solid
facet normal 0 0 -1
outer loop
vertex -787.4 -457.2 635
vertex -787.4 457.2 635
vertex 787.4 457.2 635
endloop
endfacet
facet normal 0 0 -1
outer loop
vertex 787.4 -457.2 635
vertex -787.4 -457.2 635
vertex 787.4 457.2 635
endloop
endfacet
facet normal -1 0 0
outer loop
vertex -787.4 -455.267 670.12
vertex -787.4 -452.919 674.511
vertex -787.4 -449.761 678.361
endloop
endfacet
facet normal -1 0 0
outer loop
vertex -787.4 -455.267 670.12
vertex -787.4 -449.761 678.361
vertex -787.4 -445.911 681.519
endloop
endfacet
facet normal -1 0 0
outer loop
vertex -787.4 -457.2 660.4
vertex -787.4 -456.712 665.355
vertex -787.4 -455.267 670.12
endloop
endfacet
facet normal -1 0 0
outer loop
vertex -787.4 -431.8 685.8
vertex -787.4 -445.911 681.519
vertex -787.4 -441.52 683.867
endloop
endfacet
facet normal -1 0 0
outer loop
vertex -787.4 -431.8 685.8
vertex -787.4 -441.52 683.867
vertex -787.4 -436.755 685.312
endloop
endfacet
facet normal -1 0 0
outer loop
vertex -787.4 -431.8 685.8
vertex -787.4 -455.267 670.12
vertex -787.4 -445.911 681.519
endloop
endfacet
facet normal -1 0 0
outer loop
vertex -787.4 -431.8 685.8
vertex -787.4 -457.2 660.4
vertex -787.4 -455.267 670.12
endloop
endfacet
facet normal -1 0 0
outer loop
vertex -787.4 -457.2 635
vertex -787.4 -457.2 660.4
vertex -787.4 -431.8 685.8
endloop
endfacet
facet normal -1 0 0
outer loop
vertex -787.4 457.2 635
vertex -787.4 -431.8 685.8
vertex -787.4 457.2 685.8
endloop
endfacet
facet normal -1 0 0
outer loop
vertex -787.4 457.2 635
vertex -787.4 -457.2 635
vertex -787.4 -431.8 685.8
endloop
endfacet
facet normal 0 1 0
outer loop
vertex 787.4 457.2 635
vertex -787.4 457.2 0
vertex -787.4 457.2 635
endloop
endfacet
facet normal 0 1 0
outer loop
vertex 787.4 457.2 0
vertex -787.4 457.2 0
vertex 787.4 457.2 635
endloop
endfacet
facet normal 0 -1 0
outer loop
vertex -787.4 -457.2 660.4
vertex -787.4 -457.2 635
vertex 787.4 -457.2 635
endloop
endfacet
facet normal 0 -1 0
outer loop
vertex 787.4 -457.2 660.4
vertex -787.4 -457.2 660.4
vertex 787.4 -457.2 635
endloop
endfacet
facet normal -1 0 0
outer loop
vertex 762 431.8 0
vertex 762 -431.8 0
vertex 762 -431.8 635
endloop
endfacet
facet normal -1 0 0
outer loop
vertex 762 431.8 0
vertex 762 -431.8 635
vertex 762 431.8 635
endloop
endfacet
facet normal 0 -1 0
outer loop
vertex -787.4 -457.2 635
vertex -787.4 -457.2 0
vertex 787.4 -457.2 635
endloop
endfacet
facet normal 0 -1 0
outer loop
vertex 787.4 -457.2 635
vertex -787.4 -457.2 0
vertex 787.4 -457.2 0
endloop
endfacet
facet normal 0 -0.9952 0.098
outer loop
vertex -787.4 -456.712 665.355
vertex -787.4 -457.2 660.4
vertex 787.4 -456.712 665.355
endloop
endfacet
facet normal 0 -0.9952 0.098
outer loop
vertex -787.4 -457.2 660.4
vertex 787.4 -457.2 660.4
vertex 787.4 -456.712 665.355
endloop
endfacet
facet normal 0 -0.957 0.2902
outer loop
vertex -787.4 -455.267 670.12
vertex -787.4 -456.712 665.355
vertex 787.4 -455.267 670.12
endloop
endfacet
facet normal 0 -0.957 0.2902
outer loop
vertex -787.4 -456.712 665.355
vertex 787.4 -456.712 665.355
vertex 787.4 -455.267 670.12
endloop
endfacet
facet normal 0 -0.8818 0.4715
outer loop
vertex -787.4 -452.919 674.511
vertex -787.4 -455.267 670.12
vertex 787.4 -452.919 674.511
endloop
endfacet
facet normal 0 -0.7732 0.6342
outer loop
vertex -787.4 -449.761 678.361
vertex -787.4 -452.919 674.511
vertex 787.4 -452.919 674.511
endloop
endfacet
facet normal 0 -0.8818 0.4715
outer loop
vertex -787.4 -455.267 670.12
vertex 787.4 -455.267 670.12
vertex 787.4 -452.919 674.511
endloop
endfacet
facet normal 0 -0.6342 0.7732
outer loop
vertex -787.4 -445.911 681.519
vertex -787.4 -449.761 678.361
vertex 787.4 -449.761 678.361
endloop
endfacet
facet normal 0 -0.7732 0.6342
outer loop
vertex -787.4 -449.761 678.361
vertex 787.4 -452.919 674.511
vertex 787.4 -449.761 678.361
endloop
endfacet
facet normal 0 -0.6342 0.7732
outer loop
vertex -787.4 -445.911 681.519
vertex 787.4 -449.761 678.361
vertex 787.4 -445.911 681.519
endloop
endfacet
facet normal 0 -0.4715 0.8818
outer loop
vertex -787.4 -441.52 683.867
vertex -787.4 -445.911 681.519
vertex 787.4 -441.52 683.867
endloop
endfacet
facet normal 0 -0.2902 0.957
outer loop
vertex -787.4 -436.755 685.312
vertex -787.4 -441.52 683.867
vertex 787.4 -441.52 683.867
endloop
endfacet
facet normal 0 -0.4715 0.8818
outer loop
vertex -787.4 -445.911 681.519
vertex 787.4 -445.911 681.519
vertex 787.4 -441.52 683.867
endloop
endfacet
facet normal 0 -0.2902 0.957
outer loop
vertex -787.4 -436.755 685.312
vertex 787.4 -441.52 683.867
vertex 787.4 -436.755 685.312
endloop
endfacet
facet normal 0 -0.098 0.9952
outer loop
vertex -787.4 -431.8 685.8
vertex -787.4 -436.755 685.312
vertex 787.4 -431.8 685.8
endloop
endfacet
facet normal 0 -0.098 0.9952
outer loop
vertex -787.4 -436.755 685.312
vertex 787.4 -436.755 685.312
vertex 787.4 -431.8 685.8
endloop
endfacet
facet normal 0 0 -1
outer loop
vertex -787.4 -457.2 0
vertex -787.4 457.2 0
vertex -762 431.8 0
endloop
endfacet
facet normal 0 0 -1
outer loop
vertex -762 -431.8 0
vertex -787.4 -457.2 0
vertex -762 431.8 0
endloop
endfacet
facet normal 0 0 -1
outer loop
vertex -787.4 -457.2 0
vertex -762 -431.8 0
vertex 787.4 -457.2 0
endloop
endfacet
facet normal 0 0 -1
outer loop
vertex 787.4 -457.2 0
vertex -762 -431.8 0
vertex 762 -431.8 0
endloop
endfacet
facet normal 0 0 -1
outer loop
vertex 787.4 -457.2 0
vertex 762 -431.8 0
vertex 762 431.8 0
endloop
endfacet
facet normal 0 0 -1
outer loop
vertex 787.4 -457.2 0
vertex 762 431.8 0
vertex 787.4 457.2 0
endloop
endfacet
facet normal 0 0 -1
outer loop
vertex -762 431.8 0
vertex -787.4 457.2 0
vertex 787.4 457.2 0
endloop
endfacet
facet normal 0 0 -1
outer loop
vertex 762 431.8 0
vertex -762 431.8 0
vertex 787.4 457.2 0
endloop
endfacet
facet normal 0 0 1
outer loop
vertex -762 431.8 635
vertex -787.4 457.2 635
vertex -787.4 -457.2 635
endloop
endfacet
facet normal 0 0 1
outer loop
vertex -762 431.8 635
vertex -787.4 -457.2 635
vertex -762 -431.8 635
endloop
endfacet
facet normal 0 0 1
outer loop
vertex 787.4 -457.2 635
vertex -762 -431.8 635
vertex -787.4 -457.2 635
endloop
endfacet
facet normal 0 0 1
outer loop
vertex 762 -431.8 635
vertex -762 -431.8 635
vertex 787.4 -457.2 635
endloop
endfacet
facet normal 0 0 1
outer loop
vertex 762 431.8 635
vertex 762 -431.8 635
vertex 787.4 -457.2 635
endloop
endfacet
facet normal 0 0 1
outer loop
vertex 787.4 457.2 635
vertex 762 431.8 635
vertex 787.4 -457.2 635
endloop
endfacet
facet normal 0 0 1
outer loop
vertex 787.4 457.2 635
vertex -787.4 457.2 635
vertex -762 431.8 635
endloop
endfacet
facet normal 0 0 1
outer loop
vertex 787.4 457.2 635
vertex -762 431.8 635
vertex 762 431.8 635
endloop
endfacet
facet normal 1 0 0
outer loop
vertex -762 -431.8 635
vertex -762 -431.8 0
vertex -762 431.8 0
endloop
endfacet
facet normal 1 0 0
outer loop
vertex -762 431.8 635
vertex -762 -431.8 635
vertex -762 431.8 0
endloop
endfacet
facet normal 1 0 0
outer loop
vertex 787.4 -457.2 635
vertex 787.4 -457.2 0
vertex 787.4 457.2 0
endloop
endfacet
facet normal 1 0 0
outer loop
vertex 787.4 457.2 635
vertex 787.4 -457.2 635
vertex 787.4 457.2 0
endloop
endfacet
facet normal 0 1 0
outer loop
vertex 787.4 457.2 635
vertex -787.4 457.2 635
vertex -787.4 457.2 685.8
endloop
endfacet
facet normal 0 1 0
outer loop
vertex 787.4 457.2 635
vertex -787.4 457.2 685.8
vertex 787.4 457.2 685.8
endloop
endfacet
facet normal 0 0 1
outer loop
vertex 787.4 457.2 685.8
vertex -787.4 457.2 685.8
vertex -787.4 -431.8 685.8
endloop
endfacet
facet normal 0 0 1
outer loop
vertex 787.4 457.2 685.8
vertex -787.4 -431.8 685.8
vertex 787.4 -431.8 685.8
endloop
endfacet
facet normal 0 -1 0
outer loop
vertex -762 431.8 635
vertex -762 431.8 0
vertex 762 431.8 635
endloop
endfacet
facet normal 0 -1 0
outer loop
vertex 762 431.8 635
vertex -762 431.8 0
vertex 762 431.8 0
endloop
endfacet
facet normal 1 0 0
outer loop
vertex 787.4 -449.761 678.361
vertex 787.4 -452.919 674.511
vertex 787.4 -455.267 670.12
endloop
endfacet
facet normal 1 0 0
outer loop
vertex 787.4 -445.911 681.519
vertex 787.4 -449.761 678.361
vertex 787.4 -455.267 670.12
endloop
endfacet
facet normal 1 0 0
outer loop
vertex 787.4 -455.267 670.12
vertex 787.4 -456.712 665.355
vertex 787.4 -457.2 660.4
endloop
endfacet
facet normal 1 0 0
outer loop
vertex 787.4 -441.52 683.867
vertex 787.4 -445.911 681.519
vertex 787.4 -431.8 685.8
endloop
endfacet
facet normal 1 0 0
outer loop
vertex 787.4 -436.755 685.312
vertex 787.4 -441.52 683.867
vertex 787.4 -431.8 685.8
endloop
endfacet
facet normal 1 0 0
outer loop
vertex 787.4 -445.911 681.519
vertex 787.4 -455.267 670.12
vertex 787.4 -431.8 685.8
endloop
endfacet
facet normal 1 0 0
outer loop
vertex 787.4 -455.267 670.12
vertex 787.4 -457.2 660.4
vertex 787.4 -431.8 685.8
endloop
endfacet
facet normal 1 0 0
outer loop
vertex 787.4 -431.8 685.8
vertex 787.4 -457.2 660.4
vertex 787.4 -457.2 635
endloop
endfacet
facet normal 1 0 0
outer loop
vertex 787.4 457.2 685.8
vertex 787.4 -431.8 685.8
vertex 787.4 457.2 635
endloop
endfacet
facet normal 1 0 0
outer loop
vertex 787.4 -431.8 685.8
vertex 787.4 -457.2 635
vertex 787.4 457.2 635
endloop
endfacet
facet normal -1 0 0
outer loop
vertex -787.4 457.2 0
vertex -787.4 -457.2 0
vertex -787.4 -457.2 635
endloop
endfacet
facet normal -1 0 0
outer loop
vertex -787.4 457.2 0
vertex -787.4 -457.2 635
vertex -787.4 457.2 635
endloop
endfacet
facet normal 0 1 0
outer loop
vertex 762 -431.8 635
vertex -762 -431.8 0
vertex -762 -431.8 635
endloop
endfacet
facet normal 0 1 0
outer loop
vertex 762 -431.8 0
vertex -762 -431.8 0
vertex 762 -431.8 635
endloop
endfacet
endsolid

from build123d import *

# Parameters (mm, degrees)
F0_W     = 1574.8
F0_H     = 914.4
F0_W_2   = 1524
F0_H_2   = 863.6
F1_DEPTH = 635
F2_W     = 1574.8
F2_H     = 914.4
F3_DEPTH = 50.8
F4_R     = 25.4


with BuildPart() as f1:
    # F0 (on Top) → F1 (new body)
    with BuildSketch(Plane.XY):
        Rectangle(F0_W, F0_H)
        Rectangle(F0_W_2, F0_H_2, mode=Mode.SUBTRACT)
    extrude(amount=F1_DEPTH)


with BuildPart() as f3:
    # F2 (on face) → F3 (new body)
    with BuildSketch(Plane.XY.offset(635)):
        Rectangle(F2_W, F2_H)
    extrude(amount=F3_DEPTH)

    # F4
    f4_edges = [f3.edges().sort_by_distance(p)[0] for p in [
        (0, -457.2, 685.8),
    ]]
    fillet(f4_edges, radius=F4_R)


solid = Compound([f1.part, f3.part])
